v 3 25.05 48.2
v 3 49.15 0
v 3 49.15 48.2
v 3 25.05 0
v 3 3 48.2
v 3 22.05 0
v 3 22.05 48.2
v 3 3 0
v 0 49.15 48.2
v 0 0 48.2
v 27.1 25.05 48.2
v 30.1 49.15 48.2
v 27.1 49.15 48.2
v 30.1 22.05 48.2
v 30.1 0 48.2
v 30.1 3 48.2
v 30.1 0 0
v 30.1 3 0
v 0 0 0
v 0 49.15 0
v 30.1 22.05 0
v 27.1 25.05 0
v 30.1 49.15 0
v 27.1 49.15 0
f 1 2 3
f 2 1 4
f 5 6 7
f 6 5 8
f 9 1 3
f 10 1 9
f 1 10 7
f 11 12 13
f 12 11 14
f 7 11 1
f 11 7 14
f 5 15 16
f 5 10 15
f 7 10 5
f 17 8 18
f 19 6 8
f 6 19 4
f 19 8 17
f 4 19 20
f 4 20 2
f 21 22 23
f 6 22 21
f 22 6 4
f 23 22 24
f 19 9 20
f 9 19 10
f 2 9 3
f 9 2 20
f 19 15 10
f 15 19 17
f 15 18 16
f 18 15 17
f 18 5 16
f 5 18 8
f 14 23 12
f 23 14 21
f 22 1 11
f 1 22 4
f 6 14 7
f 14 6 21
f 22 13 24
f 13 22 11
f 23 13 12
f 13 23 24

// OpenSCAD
//The length of the bracket
bracket_length = 48.2; //[1:0.1:1000]

//The thickness of the bracket
bracket_thickness = 3; //[1:0.1:1000]

//The thickness of the foam channel 
foam_thickness = 24.1; //[1:0.1:100]

//The thickness of the surface channel
mount_surface_thickness = 19.05;//[1:0.1:100]

/*[Screw Holes] */
//Enable screw holes on bottom of surface channel 
has_screw_holes = "no";//[no,yes]

//If screw holes are enabled this will be the size of the hole
screw_hole_diameter = 1;//[1:0.1:10]

number_of_screw_holes = 1;//[1:50]


module plate(length, width, thickness) {
        cube([length, width, thickness]);
}

module bracket(bracketLength, bracketThickness, foamThickness, mountSurfaceThickness) {
    
   plate(
        bracketThickness,
        (bracketThickness + mountSurfaceThickness +bracketThickness+foamThickness),
        bracketLength);
    
   translate(v=[bracketThickness,0,0]){ 
       difference(){
            plate(foamThickness+bracketThickness, bracketThickness, bracketLength);
            
          if(has_screw_holes == "yes"){
    
                //calculate screw hole spacing
                space = bracketLength/number_of_screw_holes;
              
                for(i = [(space/2):space:(bracketLength-space/2)]){
                translate(v=[((bracketThickness+foamThickness+bracketThickness)/2), bracketThickness+1, i]) {
                    rotate(a=90, v=[1,0,0]){
                    cylinder(d=screw_hole_diameter, h=bracketThickness+2, $fn=50);
                    }
                }
              }              
          }
        }
   }
   
   translate(v=[bracketThickness, mountSurfaceThickness+bracketThickness, 0]){
       plate(foamThickness+bracketThickness, bracketThickness, bracketLength);
   }
   
   translate(v=[bracketThickness+foamThickness, bracketThickness+mountSurfaceThickness+bracketThickness, 0]) {
    plate(bracketThickness, foamThickness, bracketLength);
   }
}

bracket(bracket_length, bracket_thickness, foam_thickness, mount_surface_thickness);
